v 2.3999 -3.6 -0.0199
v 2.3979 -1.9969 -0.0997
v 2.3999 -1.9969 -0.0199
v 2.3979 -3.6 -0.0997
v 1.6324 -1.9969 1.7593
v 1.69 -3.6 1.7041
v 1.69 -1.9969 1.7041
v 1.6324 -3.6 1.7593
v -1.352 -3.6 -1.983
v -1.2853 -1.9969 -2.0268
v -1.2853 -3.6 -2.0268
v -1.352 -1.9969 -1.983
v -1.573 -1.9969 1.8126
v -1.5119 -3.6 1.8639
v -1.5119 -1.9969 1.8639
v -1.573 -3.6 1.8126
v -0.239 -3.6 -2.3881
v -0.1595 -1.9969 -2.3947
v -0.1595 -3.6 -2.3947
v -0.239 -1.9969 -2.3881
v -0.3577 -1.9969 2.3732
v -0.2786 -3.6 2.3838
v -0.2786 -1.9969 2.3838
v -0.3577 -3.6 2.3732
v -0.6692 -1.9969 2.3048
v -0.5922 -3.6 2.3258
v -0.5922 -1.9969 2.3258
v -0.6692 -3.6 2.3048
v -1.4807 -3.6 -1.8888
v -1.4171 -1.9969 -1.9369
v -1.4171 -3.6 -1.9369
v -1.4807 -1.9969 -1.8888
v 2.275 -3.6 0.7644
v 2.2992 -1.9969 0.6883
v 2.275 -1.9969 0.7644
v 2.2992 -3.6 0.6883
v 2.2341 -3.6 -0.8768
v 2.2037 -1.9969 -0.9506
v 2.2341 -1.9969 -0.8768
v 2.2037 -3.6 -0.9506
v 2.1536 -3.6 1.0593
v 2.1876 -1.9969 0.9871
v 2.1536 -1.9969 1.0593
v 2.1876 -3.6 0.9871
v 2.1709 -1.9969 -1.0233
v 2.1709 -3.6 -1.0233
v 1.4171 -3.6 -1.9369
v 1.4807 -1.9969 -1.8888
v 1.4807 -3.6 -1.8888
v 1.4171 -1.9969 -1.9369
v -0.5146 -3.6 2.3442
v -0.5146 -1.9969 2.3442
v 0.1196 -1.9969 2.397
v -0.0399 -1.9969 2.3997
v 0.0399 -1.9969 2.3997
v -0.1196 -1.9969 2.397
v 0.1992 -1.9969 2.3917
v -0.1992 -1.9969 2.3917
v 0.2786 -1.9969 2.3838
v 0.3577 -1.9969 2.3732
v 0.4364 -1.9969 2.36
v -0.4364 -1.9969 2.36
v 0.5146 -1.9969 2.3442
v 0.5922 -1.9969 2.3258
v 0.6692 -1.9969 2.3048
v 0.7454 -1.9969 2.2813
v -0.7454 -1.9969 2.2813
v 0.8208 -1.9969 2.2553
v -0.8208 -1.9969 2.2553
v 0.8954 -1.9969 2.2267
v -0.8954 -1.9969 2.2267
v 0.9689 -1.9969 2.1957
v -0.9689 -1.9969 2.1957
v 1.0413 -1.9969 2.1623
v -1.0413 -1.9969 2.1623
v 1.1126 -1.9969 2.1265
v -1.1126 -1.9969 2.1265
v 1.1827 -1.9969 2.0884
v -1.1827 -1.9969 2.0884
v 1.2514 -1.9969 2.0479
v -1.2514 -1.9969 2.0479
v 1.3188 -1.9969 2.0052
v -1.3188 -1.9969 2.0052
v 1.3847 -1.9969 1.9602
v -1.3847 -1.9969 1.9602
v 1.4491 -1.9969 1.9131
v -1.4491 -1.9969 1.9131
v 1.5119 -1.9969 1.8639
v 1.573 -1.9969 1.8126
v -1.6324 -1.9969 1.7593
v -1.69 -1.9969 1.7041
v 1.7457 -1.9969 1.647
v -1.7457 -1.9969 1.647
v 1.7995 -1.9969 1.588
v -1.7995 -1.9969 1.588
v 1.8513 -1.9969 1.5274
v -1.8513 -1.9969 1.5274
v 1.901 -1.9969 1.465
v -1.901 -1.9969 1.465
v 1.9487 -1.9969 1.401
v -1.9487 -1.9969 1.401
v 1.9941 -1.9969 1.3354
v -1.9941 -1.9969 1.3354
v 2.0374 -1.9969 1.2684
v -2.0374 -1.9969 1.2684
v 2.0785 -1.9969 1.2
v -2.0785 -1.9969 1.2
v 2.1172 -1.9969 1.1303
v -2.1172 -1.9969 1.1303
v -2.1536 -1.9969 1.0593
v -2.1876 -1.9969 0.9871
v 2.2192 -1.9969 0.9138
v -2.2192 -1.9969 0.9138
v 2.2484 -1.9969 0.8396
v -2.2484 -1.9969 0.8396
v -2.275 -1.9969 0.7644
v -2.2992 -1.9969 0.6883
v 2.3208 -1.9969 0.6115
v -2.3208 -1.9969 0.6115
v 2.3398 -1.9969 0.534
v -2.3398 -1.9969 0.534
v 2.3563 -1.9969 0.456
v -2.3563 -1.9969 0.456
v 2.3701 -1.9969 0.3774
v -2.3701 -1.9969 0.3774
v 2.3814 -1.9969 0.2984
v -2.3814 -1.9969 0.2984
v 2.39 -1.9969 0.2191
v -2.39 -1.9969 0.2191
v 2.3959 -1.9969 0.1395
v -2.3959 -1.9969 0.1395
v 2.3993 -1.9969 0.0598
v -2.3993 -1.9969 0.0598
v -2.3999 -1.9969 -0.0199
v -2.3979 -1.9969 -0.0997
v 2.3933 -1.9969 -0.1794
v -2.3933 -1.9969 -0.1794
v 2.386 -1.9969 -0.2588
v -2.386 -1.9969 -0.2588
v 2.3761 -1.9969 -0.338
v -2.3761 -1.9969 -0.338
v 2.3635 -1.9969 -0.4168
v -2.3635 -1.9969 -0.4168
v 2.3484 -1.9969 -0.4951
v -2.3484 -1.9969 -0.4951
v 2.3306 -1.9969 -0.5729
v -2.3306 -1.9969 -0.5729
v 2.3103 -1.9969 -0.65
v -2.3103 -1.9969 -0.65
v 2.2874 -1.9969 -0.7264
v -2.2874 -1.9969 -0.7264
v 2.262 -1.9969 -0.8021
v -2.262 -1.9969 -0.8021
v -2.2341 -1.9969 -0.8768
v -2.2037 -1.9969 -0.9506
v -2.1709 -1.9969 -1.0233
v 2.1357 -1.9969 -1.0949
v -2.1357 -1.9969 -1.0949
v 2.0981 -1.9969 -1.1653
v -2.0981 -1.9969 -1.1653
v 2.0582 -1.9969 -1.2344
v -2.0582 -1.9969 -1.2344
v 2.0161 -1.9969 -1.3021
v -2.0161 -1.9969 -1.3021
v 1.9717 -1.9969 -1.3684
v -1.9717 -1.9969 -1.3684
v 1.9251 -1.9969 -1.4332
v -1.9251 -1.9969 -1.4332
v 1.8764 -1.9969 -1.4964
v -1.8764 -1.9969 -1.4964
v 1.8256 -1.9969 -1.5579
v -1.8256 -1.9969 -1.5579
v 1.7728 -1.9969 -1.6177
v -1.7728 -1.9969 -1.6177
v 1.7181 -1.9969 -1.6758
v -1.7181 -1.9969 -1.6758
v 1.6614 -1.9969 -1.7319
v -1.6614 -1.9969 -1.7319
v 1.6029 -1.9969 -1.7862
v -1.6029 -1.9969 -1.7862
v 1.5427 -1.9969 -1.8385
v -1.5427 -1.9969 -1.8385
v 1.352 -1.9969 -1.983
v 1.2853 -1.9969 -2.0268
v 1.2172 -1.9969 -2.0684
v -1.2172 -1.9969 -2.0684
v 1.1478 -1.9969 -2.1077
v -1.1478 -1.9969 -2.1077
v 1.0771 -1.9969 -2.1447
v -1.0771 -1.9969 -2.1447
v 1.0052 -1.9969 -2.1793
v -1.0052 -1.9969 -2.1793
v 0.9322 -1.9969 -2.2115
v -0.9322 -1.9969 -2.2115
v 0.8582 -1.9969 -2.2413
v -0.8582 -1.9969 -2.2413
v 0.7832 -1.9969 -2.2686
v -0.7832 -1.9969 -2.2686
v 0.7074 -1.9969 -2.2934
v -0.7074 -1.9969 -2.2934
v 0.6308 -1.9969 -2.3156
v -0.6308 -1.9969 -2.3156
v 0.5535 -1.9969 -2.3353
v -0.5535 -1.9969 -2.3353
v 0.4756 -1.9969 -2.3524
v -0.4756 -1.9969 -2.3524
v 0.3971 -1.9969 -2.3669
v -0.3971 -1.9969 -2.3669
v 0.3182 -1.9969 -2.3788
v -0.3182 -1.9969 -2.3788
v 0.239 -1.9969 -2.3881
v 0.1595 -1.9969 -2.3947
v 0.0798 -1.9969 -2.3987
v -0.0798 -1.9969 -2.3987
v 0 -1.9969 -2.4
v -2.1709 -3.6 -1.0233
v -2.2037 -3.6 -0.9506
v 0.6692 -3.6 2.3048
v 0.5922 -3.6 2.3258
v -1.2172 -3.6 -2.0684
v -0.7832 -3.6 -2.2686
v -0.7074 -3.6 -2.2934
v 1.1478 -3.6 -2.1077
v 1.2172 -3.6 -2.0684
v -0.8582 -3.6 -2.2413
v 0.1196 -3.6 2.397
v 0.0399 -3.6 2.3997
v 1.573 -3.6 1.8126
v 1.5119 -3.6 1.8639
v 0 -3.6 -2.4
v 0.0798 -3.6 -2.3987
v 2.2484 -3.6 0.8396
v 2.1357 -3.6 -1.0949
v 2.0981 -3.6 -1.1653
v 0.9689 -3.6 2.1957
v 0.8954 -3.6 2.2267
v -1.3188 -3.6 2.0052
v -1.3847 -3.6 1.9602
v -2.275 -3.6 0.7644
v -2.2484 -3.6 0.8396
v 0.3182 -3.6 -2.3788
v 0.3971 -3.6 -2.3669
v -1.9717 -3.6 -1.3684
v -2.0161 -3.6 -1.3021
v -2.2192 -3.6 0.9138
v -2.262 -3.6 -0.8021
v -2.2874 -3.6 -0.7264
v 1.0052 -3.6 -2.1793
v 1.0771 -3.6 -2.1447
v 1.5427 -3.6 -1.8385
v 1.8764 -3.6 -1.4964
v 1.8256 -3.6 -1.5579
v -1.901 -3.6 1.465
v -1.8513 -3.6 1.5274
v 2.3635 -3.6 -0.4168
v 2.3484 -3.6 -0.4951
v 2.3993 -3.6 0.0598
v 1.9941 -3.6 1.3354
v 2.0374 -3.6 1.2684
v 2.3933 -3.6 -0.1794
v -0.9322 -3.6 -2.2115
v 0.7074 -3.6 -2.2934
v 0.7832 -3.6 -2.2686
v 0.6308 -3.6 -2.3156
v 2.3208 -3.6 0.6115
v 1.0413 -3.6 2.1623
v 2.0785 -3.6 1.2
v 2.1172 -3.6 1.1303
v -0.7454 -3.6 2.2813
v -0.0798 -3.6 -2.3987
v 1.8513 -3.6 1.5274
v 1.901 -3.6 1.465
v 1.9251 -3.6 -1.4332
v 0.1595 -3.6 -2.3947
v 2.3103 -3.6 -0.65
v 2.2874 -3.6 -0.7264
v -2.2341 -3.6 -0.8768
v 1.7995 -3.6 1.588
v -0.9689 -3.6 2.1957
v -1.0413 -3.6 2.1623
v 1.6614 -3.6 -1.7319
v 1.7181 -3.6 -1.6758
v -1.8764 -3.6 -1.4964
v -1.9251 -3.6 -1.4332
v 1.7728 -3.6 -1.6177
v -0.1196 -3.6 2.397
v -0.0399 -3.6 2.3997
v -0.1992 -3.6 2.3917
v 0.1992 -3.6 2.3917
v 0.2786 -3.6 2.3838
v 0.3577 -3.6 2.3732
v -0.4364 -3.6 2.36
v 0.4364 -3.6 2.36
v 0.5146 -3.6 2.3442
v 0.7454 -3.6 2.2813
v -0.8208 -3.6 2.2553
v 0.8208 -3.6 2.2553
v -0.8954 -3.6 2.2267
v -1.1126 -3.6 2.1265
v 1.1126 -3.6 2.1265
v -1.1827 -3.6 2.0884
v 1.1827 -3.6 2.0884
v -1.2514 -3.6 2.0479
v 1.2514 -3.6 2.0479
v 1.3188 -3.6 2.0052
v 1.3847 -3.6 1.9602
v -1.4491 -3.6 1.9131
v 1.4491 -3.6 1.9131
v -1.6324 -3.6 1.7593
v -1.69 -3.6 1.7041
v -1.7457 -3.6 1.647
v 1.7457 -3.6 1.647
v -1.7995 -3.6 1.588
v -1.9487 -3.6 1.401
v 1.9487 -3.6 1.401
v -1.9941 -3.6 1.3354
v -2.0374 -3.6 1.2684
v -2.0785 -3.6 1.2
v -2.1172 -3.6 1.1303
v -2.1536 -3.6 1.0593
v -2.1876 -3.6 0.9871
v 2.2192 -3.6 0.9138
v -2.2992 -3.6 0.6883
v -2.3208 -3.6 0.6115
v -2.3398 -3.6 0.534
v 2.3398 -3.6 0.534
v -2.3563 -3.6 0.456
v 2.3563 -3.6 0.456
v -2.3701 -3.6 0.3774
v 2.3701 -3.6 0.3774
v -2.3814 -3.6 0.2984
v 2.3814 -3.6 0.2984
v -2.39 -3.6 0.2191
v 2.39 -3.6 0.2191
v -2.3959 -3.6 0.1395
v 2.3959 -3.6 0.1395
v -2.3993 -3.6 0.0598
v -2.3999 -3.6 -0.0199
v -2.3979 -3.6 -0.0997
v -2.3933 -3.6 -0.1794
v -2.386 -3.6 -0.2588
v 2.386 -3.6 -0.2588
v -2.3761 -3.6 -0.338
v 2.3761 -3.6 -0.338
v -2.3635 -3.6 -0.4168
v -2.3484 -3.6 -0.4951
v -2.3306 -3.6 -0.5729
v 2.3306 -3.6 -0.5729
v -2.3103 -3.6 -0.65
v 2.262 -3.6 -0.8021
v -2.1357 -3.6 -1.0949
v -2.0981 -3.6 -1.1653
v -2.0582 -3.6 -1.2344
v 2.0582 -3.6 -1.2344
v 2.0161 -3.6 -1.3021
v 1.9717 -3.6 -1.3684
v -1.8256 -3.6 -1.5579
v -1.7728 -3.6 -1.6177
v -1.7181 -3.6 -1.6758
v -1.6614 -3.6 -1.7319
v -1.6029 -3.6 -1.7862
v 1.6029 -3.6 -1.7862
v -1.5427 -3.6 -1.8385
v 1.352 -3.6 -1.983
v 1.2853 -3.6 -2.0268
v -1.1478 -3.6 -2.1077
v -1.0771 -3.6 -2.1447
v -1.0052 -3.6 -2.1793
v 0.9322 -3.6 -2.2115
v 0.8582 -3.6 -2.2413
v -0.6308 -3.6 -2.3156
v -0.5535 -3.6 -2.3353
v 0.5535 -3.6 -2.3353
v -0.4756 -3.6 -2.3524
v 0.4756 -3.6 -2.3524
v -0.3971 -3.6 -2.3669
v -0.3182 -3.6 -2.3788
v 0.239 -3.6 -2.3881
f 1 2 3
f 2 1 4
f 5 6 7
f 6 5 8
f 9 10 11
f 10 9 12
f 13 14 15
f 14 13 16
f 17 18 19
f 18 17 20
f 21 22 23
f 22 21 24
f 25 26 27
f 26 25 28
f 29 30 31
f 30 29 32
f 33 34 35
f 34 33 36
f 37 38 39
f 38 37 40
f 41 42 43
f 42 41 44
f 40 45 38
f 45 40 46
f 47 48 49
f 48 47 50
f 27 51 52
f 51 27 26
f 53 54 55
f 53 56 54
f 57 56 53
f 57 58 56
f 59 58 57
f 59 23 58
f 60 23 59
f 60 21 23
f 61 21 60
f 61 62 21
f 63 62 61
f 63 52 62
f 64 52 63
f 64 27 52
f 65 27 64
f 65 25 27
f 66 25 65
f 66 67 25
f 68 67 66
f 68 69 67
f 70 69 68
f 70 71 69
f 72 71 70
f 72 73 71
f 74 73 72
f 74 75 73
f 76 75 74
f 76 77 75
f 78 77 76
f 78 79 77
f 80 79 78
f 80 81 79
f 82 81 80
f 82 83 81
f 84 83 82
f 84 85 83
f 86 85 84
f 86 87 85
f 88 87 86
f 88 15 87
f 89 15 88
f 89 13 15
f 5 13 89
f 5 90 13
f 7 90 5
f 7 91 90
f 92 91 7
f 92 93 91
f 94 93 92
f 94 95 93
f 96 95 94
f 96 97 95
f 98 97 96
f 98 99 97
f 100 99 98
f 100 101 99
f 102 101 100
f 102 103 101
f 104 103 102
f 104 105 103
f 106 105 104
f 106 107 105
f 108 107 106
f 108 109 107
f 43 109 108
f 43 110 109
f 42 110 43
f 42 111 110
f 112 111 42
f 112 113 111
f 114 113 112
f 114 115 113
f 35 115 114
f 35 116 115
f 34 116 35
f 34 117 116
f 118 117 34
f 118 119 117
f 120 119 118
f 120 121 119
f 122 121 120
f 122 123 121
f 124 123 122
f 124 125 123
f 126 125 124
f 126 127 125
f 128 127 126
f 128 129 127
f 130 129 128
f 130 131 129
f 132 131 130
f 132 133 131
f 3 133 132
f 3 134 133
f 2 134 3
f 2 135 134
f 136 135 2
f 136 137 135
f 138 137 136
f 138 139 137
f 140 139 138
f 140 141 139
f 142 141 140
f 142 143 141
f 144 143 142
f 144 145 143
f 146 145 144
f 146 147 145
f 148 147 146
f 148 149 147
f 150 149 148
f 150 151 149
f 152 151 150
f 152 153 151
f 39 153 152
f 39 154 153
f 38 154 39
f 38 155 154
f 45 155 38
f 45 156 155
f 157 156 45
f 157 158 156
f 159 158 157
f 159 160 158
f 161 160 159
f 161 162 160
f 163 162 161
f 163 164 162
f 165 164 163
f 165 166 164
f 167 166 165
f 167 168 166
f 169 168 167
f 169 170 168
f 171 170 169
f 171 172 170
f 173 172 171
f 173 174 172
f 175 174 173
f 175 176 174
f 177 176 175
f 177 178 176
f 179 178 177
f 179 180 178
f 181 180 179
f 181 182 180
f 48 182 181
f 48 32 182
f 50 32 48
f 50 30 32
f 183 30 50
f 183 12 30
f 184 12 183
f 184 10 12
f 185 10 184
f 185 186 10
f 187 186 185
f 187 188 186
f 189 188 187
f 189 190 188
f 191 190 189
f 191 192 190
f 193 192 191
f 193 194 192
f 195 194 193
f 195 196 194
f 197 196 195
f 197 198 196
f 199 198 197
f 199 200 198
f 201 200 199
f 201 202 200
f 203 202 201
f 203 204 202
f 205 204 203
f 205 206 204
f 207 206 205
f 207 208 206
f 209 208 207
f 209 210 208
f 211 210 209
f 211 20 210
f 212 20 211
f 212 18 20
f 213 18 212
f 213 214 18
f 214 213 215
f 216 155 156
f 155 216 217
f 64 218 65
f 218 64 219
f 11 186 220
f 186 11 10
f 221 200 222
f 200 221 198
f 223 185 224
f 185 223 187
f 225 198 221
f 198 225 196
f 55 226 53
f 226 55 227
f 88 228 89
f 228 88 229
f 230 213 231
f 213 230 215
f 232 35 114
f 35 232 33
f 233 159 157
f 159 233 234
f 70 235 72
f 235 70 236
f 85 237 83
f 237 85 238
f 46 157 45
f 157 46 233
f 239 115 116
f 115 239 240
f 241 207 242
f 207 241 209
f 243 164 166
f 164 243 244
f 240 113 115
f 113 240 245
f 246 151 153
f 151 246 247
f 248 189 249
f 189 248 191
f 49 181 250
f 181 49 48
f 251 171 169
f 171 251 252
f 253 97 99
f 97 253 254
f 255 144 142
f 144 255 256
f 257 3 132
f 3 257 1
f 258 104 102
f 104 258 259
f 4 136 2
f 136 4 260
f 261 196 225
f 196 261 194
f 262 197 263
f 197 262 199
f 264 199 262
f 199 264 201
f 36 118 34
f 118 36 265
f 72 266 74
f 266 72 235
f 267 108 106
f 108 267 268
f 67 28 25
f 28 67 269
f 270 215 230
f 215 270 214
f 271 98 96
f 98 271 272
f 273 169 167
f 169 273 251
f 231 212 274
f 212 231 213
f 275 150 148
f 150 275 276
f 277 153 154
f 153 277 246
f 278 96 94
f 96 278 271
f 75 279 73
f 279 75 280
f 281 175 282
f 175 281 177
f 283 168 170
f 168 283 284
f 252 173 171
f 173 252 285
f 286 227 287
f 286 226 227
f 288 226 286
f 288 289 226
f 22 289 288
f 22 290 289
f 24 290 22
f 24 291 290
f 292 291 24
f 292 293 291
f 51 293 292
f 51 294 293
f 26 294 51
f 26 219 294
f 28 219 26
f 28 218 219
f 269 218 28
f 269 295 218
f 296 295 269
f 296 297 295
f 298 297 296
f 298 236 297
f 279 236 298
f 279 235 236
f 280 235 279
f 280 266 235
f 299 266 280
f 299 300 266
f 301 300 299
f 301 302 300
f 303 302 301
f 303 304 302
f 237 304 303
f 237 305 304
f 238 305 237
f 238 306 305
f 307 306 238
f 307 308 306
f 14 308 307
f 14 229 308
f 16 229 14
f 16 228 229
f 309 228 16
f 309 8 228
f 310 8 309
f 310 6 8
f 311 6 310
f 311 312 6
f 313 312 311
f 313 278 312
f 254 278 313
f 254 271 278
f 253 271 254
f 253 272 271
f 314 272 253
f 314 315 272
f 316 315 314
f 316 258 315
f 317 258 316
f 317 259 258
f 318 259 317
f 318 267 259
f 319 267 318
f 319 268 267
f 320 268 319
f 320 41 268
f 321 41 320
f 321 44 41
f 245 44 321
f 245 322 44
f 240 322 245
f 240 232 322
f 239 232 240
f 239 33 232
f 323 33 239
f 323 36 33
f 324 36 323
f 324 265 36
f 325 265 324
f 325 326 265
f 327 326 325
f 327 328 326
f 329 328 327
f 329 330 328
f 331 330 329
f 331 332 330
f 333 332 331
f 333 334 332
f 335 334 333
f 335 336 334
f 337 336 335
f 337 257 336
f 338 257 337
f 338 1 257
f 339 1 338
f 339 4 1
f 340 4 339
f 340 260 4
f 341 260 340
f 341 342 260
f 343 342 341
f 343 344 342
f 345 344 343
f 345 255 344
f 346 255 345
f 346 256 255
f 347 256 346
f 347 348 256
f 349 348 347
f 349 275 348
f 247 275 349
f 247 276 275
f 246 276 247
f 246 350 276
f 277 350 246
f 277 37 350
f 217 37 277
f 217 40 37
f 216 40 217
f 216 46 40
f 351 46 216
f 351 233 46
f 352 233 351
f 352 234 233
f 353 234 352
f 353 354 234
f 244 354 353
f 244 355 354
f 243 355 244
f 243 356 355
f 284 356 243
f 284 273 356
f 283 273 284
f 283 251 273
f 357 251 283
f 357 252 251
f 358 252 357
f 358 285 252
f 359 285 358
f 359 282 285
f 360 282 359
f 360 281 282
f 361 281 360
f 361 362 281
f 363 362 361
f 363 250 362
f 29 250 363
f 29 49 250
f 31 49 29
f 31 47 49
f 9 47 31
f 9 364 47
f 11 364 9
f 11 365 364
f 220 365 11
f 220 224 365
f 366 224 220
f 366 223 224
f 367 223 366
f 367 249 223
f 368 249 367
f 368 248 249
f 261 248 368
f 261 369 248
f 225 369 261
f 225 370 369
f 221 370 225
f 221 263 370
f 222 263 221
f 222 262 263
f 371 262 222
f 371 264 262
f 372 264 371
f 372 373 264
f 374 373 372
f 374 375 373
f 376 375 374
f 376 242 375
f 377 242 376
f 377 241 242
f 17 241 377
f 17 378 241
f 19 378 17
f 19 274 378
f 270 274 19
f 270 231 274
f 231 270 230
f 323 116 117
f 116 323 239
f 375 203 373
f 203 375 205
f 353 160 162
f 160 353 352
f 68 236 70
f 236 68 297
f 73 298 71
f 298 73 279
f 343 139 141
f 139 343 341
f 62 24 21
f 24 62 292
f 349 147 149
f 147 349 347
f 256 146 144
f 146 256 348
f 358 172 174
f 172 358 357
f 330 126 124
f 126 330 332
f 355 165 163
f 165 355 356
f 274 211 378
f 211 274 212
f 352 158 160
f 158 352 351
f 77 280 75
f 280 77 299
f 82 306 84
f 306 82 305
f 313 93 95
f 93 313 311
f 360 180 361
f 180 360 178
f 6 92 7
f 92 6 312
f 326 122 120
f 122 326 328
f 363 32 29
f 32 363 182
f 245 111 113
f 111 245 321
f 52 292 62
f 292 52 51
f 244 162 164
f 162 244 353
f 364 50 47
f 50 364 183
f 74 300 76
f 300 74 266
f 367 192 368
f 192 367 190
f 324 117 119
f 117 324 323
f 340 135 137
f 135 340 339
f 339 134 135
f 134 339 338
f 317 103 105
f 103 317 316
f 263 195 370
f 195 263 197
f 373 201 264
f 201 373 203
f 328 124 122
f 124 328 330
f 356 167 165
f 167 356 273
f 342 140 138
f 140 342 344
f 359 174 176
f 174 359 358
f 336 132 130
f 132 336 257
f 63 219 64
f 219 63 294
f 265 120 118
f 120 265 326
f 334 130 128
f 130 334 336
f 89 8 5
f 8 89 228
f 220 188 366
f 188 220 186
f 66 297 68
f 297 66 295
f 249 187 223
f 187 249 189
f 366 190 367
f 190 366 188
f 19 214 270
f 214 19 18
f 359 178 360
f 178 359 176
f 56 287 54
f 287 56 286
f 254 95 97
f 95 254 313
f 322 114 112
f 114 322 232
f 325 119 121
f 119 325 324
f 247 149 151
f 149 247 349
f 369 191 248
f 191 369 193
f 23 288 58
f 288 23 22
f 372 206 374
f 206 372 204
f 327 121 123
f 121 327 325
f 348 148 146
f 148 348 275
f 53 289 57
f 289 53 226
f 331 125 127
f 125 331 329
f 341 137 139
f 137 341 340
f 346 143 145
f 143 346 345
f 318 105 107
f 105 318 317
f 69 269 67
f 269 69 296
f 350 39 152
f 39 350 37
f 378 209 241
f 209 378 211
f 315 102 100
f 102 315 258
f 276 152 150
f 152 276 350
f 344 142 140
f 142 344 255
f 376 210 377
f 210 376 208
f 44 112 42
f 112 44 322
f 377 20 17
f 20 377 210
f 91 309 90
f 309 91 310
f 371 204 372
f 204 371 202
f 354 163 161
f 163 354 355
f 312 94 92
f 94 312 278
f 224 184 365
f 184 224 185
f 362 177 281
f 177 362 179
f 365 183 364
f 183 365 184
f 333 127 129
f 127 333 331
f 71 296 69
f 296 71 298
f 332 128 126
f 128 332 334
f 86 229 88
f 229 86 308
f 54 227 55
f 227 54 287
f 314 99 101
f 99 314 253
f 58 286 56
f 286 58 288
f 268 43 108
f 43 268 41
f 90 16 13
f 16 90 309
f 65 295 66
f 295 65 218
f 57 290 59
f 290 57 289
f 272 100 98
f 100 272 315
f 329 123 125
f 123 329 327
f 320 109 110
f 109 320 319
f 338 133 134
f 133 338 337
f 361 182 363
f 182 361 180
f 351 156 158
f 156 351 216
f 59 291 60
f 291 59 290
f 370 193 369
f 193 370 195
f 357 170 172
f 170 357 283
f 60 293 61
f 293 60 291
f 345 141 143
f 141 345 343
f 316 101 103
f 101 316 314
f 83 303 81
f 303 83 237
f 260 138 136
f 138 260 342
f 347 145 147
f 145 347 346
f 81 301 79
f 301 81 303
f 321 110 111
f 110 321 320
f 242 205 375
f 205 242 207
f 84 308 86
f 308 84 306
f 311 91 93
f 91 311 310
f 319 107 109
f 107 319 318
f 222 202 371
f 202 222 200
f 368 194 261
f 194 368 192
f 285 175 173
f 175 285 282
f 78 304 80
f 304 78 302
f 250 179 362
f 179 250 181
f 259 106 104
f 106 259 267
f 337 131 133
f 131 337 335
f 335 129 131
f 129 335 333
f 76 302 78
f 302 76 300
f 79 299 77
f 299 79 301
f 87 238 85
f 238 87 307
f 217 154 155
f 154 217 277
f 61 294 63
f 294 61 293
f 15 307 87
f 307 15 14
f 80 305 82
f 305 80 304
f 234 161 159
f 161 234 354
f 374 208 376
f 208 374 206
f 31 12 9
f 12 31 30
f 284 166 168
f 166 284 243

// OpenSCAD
use <../lib.scad>
use <20.scad>
$fa=1; $fs=0.2;
function ldraw_lib__3137b(realsolid=false) = [
// 0 ~Moved to 20
// 0 Name: 3137b.dat
// 0 Author: [PTadmin]
// 0 !LDRAW_ORG Part UPDATE 1999-03
// 0 !LICENSE Licensed under CC BY 4.0 : see CAreadme.txt
// 
// 0 BFC CERTIFY CCW
  [0,"BFC","CERTIFY"],
  [0,"BFC","CCW"],
// 
// 0 !HISTORY 1999-05-17 [PTadmin] Official Update 1999-03
// 0 !HISTORY 2007-06-24 [PTadmin] Header formatted for Contributor Agreement
// 0 !HISTORY 2008-07-01 [PTadmin] Official Update 2008-01
// 
// 
// 1 16 0 0 0 1 0 0 0 1 0 0 0 1 20.dat
  [1,16,0,0,0,1,0,0,0,1,0,0,0,1, ldraw_lib__20(realsolid)],
];
module ldraw_lib__3137b(step=0, col=false, unit=2/5, alt=false, line=0.2, solid=!$preview)
    makepoly(ldraw_lib__3137b(solid), step=step, col=col, unit=unit, alt=alt, line=line, solid=solid);
ldraw_lib__3137b(line=0.2);
